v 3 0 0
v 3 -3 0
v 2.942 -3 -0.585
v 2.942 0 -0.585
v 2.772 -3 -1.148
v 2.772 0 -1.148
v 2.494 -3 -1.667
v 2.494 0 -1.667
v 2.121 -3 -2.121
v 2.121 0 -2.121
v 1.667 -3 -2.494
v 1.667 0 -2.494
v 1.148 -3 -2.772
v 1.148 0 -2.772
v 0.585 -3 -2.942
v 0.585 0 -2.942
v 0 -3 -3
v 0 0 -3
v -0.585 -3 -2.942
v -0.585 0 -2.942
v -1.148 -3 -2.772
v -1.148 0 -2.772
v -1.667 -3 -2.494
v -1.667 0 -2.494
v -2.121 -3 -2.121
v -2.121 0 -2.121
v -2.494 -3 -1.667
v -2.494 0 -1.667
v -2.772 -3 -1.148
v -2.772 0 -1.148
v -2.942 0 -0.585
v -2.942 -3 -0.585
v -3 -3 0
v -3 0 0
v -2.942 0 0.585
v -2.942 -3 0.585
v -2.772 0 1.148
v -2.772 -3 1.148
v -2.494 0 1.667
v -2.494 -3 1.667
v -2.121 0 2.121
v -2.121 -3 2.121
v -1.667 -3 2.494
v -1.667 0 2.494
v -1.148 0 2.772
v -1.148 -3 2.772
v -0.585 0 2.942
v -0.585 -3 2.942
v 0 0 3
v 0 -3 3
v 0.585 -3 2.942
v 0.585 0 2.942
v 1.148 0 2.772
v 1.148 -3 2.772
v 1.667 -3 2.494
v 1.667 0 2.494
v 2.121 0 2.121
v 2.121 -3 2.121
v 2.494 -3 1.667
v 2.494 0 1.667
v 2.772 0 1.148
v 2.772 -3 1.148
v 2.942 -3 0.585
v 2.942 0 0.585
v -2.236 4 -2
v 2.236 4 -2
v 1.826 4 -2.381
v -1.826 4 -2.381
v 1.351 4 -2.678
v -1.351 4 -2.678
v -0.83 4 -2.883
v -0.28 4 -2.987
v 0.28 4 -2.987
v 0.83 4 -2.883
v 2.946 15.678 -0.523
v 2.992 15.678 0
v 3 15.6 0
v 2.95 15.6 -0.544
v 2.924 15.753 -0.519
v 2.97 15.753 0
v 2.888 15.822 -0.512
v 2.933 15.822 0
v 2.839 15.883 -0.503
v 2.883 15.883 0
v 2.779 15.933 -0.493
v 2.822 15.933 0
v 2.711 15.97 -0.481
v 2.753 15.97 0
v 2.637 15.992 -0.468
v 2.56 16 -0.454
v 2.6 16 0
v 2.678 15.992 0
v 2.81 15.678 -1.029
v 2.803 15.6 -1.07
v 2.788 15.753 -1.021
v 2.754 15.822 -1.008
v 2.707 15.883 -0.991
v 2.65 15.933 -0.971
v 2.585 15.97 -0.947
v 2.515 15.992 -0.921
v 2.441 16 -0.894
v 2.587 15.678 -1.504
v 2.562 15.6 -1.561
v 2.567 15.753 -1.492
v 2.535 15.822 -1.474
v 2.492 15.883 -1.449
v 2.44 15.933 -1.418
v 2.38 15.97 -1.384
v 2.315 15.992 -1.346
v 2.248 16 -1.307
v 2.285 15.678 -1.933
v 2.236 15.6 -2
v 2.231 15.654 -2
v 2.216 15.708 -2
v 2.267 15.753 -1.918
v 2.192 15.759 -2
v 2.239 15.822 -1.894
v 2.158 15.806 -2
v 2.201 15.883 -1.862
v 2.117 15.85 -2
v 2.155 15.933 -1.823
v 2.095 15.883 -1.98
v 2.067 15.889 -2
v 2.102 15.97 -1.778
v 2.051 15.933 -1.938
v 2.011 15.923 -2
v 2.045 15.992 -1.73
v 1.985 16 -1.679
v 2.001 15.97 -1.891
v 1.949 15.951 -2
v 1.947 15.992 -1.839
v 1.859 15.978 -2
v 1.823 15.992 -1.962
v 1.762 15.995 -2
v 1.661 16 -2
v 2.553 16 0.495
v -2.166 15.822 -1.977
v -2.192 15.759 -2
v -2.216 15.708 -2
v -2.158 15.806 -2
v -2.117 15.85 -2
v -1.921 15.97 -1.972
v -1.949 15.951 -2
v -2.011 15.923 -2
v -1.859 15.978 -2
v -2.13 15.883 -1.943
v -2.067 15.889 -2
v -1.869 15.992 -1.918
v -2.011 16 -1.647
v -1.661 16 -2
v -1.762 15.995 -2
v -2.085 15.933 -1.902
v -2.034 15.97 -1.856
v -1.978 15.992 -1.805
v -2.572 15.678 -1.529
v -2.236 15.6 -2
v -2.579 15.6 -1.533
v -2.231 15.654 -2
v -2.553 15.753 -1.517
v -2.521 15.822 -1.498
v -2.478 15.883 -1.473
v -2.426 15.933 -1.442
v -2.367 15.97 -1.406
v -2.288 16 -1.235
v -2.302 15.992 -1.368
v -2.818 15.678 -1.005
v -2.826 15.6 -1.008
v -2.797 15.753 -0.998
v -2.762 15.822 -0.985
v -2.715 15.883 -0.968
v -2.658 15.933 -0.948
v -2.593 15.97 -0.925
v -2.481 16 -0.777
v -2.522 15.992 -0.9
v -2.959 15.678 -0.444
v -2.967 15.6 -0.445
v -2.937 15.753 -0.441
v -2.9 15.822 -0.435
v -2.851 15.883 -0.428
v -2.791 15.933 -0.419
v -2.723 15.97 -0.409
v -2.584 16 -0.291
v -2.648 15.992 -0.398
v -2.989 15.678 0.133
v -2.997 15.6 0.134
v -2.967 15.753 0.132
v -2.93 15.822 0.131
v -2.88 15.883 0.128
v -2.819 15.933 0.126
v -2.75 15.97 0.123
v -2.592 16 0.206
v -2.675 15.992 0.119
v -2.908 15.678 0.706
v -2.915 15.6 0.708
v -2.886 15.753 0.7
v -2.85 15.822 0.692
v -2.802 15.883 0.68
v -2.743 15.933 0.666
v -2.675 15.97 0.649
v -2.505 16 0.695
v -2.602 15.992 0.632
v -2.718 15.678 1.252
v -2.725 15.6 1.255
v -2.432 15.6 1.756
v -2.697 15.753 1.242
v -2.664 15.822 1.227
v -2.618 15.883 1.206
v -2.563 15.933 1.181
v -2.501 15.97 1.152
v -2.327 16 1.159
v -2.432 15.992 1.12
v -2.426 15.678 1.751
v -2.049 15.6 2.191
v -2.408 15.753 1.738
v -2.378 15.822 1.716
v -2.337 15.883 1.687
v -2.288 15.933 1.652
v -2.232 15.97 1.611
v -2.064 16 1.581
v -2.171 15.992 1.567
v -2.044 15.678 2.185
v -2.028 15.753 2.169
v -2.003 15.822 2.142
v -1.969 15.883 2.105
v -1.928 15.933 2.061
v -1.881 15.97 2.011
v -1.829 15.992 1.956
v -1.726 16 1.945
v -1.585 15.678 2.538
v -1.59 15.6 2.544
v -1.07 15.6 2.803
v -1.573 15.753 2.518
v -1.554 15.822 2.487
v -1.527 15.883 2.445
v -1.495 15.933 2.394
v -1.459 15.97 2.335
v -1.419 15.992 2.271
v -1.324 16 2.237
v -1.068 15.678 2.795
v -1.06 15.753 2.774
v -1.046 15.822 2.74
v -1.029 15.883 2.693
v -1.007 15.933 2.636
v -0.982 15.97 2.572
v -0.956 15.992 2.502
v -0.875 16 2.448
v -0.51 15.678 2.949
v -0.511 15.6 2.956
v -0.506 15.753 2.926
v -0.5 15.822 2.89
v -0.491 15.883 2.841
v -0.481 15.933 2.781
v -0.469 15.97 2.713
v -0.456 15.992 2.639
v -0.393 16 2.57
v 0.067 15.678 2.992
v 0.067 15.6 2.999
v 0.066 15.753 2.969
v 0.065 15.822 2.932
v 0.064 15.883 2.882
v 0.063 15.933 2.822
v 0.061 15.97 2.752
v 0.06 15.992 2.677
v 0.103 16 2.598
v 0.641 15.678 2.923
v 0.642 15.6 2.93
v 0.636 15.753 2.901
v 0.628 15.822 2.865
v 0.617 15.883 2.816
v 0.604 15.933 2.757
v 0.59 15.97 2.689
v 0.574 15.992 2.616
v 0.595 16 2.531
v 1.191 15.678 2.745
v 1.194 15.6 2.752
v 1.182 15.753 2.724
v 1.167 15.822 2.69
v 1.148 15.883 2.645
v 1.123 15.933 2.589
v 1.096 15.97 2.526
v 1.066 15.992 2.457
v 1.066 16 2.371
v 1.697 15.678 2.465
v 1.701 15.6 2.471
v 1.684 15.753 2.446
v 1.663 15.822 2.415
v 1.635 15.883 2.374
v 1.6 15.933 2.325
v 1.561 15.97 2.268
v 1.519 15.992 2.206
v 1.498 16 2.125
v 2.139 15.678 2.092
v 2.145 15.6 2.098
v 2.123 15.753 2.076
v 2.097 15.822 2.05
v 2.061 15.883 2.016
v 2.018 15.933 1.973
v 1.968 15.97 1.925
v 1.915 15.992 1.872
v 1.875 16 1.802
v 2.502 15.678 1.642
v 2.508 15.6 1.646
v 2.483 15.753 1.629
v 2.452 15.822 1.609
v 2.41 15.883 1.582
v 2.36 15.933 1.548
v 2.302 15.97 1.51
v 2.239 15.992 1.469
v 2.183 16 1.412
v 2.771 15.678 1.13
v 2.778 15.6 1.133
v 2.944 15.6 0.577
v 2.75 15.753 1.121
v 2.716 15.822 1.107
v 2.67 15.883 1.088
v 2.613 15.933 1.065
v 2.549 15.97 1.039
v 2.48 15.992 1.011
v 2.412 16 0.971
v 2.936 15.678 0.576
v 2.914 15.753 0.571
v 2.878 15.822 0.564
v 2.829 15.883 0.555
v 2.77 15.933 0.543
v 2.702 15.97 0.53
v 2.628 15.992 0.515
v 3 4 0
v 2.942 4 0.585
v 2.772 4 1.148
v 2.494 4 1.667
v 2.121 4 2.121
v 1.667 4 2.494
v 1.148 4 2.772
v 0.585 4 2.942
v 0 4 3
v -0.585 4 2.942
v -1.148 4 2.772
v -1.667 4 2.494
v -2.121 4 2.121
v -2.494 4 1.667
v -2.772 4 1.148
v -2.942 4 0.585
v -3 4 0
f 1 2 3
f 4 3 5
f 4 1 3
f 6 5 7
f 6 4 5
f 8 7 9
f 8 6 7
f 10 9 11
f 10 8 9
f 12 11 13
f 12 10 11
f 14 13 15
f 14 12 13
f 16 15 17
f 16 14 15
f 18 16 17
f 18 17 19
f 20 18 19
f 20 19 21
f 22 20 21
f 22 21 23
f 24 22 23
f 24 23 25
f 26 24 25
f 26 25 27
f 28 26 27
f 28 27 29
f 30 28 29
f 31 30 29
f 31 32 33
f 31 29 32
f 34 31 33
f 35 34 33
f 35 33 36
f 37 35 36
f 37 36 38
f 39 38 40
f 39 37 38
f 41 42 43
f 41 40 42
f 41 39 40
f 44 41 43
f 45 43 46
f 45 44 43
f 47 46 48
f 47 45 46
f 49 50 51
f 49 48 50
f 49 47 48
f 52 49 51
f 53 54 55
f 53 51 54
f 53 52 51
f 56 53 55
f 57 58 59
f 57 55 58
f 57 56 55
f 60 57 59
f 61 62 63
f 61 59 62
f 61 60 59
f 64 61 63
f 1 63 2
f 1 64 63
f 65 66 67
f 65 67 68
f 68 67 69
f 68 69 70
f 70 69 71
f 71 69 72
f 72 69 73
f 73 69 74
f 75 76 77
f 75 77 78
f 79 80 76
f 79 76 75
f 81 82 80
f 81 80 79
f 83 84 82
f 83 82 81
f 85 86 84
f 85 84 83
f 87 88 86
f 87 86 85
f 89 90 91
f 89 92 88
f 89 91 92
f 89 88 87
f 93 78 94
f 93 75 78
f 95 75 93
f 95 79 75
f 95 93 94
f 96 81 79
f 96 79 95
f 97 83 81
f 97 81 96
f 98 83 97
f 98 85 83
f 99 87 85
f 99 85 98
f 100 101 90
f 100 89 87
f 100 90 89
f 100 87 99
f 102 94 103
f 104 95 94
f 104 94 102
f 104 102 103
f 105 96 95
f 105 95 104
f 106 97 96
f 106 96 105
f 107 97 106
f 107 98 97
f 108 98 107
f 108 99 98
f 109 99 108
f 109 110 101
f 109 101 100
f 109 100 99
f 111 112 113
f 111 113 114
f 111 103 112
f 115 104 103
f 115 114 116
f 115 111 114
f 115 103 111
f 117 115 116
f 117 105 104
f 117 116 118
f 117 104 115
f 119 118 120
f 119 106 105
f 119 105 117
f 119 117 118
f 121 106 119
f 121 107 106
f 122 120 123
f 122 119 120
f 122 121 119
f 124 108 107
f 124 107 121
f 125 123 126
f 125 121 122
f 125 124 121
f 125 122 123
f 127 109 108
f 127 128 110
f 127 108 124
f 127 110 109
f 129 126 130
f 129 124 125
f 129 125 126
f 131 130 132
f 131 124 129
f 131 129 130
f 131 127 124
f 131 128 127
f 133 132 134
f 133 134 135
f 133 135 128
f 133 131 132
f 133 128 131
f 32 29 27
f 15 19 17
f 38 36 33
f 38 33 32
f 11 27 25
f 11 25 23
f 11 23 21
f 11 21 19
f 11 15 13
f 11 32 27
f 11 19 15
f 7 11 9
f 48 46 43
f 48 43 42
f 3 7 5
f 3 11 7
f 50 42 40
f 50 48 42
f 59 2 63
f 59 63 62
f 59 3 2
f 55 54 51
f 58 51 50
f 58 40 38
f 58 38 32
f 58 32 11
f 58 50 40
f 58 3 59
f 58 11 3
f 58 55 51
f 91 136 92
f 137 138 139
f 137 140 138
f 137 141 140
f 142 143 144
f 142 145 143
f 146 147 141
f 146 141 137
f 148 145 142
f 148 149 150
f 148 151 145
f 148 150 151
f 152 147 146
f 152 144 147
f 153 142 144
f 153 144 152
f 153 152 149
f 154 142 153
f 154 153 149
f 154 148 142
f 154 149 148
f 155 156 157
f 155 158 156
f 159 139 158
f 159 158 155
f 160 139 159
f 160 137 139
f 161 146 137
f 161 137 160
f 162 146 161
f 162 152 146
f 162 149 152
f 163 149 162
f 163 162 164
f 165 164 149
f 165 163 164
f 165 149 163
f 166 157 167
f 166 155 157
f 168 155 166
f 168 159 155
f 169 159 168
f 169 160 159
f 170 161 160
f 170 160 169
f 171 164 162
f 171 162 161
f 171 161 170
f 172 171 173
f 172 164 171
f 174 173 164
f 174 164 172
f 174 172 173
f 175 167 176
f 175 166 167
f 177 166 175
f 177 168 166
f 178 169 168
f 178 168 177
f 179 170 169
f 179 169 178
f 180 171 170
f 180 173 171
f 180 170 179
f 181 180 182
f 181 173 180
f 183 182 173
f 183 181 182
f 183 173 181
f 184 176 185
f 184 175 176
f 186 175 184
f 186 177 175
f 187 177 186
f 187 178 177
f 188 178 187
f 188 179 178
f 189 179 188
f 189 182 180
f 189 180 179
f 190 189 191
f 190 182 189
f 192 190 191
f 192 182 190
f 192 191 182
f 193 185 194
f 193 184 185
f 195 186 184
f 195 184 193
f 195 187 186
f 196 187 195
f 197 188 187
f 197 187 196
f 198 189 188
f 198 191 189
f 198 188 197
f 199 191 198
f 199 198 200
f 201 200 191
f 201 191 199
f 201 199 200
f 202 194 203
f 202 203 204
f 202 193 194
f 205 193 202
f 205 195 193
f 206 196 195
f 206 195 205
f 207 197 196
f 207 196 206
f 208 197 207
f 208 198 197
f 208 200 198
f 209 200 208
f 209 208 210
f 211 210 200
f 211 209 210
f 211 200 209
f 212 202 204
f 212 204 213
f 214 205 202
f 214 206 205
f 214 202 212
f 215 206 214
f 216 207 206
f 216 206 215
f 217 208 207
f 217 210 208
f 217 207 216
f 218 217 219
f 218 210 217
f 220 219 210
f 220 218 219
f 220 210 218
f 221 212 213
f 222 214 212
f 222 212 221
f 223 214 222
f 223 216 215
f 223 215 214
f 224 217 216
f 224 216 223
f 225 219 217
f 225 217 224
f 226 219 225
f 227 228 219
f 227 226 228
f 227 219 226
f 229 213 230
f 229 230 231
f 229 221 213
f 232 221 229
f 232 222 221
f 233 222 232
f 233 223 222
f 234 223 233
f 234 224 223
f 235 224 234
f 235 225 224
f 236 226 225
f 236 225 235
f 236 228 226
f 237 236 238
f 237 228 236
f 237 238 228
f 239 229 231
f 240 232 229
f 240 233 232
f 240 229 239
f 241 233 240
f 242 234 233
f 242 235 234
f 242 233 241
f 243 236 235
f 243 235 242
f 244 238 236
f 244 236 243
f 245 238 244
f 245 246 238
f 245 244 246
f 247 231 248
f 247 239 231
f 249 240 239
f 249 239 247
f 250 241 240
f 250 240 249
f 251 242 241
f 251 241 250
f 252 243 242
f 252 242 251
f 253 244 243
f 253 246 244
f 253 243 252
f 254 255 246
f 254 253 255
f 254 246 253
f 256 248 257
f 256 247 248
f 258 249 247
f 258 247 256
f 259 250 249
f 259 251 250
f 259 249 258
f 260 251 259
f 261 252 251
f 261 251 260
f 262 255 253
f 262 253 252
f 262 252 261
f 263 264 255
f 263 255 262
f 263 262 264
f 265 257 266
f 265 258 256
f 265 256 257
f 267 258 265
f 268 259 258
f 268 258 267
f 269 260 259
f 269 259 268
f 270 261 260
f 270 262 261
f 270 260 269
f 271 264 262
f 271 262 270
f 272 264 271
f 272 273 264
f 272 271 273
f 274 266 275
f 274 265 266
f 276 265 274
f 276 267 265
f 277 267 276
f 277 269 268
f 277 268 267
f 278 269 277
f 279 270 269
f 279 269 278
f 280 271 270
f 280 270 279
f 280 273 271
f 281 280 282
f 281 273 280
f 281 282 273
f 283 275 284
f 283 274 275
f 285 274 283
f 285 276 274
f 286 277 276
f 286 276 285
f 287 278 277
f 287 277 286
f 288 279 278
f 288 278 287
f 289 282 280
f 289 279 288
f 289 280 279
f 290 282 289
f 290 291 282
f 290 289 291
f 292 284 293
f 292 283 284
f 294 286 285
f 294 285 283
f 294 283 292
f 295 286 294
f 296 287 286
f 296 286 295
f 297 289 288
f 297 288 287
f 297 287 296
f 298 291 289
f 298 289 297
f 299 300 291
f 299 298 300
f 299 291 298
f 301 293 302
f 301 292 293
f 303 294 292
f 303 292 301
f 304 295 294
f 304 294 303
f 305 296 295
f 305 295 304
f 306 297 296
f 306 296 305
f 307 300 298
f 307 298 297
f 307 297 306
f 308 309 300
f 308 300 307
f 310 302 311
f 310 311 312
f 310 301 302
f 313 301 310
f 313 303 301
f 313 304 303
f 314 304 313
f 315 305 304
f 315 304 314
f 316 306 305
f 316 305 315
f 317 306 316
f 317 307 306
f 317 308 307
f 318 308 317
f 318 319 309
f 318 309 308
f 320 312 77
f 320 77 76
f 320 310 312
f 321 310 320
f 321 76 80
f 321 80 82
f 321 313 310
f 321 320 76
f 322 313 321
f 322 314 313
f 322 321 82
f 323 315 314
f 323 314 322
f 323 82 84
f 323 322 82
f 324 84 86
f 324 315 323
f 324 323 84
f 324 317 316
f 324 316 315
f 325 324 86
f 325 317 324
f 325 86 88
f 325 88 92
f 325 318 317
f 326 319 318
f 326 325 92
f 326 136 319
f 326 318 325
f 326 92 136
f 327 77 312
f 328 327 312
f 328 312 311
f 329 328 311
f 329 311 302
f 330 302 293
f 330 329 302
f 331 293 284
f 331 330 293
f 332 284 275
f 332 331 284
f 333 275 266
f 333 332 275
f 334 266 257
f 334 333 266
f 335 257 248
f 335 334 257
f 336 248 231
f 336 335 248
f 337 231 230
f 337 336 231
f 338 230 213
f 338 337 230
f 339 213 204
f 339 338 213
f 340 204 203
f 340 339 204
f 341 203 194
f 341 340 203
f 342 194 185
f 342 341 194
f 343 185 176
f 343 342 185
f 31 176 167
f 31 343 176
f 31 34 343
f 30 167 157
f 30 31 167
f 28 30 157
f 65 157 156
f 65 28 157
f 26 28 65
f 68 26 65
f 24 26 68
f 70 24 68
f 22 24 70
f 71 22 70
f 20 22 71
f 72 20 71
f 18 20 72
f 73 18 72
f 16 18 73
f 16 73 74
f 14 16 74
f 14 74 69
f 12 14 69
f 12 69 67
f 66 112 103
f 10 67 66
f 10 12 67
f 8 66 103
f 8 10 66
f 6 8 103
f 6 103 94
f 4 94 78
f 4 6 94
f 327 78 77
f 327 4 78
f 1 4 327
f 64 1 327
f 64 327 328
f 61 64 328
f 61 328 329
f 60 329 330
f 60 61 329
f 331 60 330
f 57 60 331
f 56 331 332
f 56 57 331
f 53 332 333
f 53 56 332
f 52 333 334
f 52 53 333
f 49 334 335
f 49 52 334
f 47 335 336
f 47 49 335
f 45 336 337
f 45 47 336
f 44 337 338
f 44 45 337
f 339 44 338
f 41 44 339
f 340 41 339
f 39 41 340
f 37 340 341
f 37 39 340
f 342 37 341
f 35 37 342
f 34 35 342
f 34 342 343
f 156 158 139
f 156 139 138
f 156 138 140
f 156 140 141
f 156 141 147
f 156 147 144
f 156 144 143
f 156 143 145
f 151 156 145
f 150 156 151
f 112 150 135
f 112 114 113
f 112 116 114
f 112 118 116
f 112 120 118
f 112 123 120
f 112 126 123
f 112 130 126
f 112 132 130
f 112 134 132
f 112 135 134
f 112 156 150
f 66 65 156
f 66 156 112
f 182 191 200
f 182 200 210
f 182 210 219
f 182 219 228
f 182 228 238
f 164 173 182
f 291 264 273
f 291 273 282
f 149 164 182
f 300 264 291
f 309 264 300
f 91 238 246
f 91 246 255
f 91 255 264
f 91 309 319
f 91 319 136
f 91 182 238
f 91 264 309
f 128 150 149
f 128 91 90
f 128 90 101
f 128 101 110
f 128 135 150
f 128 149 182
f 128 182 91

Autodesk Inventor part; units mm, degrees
ref_plane "YZ Plane" through (0, 0, 0) normal (1, 0, 0) x (0, 1, 0)
ref_plane "XZ Plane" through (0, 0, 0) normal (0, 1, 0) x (-1, 0, 0)
ref_plane "XY Plane" through (0, 0, 0) normal (0, 0, 1) x (1, 0, 0)
sketch "スケッチ1" plane through (0, 0, 0) normal (0, 1, 0) x (-1, 0, 0)
  circle A0 centre (0, 0) radius 3
  dimension "d0" = 6
extrude "押し出し1" add sketch "スケッチ1" along normal blind 4
sketch "スケッチ2" plane through (0, 4, 0) normal (0, 1, 0) x (1, 0, 0)
  circle A0 centre (0, 0) radius 3 projected
  line L0 (0, 3) -> (0, 2)
  line L1 (0, 2) -> (2.2361, 2)
  arc A1 (-2.2361, 2) -> (2.2361, 2) centre (0, 0) ccw
  line L2 (-2.2361, 2) -> (0, 2)
  dimension "d3" = 1
extrude "押し出し2" add sketch "スケッチ2" along normal blind 12 contours A0 L2 L1
sketch "スケッチ3" plane through (0, 0, 0) normal (0, -1, 0) x (1, 0, 0)
  circle A0 centre (0, 0) radius 3
extrude "押し出し3" add sketch "スケッチ3" along normal blind 3
fillet "フィレット1" radius 0.4 1 edges at (0, 16, 3)
properties part number "モーター100：1軸"
